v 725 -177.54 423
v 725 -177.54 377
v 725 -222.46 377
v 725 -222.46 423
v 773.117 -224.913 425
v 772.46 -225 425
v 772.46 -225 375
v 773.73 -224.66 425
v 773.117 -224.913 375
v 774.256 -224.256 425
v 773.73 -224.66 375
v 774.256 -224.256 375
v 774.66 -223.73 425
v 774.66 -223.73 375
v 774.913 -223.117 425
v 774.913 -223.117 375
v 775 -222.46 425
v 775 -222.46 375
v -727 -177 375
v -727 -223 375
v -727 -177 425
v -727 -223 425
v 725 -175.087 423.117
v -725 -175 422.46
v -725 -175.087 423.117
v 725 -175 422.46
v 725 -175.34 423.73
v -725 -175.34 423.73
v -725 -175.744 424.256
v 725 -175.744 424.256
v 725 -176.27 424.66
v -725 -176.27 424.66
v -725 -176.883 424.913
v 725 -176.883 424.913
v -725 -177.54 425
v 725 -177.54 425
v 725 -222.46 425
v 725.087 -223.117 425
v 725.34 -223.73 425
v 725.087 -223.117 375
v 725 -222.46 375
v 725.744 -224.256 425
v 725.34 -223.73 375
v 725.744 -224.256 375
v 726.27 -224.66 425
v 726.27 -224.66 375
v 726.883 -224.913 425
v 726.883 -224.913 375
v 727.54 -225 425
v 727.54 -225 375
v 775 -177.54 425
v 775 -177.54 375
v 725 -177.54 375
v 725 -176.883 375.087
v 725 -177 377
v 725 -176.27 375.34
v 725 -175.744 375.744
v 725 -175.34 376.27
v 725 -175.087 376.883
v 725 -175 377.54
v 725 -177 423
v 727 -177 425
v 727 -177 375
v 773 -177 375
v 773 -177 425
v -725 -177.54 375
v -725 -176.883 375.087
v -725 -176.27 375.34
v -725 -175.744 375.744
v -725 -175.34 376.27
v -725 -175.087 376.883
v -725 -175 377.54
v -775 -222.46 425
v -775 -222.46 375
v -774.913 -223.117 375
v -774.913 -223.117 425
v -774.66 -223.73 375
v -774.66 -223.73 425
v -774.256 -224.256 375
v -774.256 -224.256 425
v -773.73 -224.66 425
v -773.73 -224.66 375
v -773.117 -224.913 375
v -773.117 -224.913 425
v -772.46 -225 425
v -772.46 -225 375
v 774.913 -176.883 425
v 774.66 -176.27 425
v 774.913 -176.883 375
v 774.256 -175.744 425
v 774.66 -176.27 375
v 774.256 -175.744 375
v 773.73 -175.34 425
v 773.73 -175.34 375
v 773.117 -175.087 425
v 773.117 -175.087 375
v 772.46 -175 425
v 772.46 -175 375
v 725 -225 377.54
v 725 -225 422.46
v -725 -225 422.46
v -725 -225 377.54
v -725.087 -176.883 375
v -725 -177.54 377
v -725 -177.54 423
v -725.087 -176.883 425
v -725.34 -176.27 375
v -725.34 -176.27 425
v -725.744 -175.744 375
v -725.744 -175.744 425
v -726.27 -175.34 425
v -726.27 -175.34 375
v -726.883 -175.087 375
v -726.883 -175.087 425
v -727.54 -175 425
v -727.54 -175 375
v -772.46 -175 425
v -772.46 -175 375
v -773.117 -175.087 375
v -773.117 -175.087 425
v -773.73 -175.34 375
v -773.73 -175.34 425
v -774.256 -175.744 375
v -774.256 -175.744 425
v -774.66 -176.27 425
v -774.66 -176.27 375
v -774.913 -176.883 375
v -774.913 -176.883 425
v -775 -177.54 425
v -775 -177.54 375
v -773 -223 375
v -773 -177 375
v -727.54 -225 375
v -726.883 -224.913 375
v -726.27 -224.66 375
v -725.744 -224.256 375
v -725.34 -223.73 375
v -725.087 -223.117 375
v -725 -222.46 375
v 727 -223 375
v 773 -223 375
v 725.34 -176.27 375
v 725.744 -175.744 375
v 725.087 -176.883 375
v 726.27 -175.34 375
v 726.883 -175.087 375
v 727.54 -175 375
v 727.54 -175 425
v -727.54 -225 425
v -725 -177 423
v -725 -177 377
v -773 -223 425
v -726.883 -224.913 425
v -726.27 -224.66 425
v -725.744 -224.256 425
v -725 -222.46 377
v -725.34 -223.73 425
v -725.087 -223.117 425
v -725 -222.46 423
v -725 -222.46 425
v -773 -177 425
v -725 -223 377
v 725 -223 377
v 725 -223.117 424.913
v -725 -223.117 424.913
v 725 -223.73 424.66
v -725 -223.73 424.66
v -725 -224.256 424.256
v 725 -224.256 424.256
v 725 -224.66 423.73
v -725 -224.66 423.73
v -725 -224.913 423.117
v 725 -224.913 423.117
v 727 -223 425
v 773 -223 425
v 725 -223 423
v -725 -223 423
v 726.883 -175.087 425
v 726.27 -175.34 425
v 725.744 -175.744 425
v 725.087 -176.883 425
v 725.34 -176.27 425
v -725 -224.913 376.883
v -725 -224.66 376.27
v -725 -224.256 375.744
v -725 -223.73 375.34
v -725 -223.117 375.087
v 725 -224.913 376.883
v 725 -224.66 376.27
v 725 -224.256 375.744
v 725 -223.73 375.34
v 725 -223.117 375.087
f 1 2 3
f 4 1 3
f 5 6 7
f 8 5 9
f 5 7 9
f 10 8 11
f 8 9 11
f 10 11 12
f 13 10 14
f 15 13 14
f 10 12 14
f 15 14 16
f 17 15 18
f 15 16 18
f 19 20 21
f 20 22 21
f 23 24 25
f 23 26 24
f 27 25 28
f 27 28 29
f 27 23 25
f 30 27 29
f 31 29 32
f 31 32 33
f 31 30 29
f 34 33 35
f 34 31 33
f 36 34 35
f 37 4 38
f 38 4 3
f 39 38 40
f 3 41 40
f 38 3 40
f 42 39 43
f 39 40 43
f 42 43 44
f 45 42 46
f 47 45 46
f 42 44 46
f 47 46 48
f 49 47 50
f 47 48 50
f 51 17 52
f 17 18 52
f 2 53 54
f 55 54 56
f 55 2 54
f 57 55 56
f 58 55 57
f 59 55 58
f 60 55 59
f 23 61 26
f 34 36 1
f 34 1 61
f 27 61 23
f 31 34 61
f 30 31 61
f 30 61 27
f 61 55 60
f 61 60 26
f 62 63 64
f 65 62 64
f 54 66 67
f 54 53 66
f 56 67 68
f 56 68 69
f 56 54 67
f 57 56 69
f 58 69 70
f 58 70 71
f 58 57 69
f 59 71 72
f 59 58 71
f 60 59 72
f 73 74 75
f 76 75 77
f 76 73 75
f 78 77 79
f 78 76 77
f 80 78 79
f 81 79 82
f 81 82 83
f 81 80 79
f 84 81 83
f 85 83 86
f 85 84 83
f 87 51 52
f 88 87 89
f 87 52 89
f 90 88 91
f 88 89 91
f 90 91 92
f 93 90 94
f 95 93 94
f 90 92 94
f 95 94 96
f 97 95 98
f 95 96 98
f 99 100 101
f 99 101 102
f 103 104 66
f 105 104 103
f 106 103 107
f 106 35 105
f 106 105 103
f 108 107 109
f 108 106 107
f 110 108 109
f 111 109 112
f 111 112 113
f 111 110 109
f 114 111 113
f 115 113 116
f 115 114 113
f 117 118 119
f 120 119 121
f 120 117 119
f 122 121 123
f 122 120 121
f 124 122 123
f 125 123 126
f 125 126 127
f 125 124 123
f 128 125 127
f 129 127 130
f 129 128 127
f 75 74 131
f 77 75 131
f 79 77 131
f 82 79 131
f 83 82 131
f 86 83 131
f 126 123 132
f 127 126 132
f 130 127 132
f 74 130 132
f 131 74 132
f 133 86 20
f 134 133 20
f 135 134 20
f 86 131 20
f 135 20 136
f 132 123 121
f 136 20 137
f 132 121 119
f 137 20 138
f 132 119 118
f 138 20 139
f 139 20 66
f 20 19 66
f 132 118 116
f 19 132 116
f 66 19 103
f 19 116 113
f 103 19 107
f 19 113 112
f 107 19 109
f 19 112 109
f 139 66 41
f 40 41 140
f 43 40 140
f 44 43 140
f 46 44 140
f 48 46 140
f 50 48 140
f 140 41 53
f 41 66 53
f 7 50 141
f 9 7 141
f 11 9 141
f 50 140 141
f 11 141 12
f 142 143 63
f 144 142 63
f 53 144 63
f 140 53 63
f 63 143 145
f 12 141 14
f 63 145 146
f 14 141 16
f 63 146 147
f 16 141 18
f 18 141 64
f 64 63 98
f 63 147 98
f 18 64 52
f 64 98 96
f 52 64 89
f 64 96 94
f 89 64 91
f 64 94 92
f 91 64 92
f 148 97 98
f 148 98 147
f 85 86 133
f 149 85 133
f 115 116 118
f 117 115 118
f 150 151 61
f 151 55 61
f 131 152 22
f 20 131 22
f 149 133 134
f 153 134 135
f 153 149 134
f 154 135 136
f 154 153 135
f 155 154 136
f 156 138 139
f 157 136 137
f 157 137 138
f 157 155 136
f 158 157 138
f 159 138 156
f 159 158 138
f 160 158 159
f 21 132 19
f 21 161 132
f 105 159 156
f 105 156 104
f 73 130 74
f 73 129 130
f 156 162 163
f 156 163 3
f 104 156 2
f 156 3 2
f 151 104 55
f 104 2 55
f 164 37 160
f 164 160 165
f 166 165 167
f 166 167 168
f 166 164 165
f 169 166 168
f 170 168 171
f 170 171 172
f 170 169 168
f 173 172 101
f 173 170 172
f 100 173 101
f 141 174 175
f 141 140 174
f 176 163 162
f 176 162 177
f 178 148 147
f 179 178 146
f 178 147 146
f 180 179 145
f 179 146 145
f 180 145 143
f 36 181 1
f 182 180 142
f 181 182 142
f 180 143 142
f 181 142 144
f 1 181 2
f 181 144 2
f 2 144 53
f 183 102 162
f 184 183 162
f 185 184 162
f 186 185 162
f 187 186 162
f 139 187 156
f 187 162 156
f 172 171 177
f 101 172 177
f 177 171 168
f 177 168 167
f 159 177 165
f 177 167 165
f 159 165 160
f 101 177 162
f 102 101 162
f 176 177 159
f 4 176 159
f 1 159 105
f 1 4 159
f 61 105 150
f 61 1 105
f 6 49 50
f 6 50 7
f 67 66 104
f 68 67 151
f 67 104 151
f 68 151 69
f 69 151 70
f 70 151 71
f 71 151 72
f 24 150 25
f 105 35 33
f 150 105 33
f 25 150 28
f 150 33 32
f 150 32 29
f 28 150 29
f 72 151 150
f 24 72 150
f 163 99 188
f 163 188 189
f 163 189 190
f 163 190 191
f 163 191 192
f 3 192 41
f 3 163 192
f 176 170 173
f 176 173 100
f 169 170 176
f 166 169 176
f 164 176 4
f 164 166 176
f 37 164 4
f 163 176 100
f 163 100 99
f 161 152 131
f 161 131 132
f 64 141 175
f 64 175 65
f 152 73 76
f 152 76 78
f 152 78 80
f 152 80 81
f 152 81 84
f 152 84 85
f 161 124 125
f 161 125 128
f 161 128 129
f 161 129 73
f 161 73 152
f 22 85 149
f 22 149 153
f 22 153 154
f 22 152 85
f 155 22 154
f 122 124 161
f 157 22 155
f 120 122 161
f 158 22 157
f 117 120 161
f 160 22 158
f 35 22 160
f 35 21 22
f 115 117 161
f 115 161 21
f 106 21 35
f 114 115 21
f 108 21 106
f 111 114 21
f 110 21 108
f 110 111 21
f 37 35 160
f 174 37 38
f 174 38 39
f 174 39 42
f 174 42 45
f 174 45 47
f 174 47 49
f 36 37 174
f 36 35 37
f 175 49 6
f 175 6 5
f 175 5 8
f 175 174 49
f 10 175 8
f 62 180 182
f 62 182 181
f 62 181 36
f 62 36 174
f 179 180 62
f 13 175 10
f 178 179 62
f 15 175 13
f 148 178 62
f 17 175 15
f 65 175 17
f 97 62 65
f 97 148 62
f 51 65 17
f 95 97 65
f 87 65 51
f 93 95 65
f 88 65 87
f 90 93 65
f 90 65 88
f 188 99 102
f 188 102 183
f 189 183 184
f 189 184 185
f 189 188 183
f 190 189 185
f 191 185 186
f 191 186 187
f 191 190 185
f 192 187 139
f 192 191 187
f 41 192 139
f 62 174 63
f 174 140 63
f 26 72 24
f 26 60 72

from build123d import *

# Parameters (mm, degrees)
F0_W     = 46
F0_H     = 46
F1_DEPTH = 725
F3_W     = 46
F3_H     = 46
F4_DEPTH = 25


with BuildPart() as f1:
    # F0 (on Right) → F1 (new body, symmetric)
    with BuildSketch(Plane.YZ):
        with BuildLine():
            ThreePointArc((-175, 422.46), (-175.743949, 424.256051), (-177.54, 425))
            Line((-177.54, 425), (-222.46, 425))
            ThreePointArc((-222.46, 425), (-224.256051, 424.256051), (-225, 422.46))
            Line((-225, 422.46), (-225, 377.54))
            ThreePointArc((-225, 377.54), (-224.256051, 375.743949), (-222.46, 375))
            Line((-222.46, 375), (-177.54, 375))
            ThreePointArc((-177.54, 375), (-175.743949, 375.743949), (-175, 377.54))
            Line((-175, 377.54), (-175, 422.46))
        make_face()
        with Locations((-200, 400)):
            Rectangle(F0_W, F0_H, mode=Mode.SUBTRACT)
    extrude(amount=F1_DEPTH, both=True)

    # F3 (on offset) → F4 (join, symmetric)
    with BuildSketch(Plane.XY.offset(400)):
        with BuildLine():
            Line((727.54, -225), (772.46, -225))
            ThreePointArc((772.46, -225), (774.256051, -224.256051), (775, -222.46))
            Line((775, -222.46), (775, -177.54))
            ThreePointArc((775, -177.54), (774.256051, -175.743949), (772.46, -175))
            Line((772.46, -175), (727.54, -175))
            ThreePointArc((727.54, -175), (725.743949, -175.743949), (725, -177.54))
            Line((725, -177.54), (725, -222.46))
            ThreePointArc((725, -222.46), (725.743949, -224.256051), (727.54, -225))
        make_face()
        with Locations((750, -200)):
            Rectangle(F3_W, F3_H, mode=Mode.SUBTRACT)
        with BuildLine():
            ThreePointArc((-775, -222.46), (-774.256051, -224.256051), (-772.46, -225))
            Line((-772.46, -225), (-727.54, -225))
            ThreePointArc((-727.54, -225), (-725.743949, -224.256051), (-725, -222.46))
            Line((-725, -222.46), (-725, -177.54))
            ThreePointArc((-725, -177.54), (-725.743949, -175.743949), (-727.54, -175))
            Line((-727.54, -175), (-772.46, -175))
            ThreePointArc((-772.46, -175), (-774.256051, -175.743949), (-775, -177.54))
            Line((-775, -177.54), (-775, -222.46))
        make_face()
        with Locations((-750, -200)):
            Rectangle(F3_W, F3_H, mode=Mode.SUBTRACT)
    extrude(amount=F4_DEPTH, both=True)


solid = f1.part
